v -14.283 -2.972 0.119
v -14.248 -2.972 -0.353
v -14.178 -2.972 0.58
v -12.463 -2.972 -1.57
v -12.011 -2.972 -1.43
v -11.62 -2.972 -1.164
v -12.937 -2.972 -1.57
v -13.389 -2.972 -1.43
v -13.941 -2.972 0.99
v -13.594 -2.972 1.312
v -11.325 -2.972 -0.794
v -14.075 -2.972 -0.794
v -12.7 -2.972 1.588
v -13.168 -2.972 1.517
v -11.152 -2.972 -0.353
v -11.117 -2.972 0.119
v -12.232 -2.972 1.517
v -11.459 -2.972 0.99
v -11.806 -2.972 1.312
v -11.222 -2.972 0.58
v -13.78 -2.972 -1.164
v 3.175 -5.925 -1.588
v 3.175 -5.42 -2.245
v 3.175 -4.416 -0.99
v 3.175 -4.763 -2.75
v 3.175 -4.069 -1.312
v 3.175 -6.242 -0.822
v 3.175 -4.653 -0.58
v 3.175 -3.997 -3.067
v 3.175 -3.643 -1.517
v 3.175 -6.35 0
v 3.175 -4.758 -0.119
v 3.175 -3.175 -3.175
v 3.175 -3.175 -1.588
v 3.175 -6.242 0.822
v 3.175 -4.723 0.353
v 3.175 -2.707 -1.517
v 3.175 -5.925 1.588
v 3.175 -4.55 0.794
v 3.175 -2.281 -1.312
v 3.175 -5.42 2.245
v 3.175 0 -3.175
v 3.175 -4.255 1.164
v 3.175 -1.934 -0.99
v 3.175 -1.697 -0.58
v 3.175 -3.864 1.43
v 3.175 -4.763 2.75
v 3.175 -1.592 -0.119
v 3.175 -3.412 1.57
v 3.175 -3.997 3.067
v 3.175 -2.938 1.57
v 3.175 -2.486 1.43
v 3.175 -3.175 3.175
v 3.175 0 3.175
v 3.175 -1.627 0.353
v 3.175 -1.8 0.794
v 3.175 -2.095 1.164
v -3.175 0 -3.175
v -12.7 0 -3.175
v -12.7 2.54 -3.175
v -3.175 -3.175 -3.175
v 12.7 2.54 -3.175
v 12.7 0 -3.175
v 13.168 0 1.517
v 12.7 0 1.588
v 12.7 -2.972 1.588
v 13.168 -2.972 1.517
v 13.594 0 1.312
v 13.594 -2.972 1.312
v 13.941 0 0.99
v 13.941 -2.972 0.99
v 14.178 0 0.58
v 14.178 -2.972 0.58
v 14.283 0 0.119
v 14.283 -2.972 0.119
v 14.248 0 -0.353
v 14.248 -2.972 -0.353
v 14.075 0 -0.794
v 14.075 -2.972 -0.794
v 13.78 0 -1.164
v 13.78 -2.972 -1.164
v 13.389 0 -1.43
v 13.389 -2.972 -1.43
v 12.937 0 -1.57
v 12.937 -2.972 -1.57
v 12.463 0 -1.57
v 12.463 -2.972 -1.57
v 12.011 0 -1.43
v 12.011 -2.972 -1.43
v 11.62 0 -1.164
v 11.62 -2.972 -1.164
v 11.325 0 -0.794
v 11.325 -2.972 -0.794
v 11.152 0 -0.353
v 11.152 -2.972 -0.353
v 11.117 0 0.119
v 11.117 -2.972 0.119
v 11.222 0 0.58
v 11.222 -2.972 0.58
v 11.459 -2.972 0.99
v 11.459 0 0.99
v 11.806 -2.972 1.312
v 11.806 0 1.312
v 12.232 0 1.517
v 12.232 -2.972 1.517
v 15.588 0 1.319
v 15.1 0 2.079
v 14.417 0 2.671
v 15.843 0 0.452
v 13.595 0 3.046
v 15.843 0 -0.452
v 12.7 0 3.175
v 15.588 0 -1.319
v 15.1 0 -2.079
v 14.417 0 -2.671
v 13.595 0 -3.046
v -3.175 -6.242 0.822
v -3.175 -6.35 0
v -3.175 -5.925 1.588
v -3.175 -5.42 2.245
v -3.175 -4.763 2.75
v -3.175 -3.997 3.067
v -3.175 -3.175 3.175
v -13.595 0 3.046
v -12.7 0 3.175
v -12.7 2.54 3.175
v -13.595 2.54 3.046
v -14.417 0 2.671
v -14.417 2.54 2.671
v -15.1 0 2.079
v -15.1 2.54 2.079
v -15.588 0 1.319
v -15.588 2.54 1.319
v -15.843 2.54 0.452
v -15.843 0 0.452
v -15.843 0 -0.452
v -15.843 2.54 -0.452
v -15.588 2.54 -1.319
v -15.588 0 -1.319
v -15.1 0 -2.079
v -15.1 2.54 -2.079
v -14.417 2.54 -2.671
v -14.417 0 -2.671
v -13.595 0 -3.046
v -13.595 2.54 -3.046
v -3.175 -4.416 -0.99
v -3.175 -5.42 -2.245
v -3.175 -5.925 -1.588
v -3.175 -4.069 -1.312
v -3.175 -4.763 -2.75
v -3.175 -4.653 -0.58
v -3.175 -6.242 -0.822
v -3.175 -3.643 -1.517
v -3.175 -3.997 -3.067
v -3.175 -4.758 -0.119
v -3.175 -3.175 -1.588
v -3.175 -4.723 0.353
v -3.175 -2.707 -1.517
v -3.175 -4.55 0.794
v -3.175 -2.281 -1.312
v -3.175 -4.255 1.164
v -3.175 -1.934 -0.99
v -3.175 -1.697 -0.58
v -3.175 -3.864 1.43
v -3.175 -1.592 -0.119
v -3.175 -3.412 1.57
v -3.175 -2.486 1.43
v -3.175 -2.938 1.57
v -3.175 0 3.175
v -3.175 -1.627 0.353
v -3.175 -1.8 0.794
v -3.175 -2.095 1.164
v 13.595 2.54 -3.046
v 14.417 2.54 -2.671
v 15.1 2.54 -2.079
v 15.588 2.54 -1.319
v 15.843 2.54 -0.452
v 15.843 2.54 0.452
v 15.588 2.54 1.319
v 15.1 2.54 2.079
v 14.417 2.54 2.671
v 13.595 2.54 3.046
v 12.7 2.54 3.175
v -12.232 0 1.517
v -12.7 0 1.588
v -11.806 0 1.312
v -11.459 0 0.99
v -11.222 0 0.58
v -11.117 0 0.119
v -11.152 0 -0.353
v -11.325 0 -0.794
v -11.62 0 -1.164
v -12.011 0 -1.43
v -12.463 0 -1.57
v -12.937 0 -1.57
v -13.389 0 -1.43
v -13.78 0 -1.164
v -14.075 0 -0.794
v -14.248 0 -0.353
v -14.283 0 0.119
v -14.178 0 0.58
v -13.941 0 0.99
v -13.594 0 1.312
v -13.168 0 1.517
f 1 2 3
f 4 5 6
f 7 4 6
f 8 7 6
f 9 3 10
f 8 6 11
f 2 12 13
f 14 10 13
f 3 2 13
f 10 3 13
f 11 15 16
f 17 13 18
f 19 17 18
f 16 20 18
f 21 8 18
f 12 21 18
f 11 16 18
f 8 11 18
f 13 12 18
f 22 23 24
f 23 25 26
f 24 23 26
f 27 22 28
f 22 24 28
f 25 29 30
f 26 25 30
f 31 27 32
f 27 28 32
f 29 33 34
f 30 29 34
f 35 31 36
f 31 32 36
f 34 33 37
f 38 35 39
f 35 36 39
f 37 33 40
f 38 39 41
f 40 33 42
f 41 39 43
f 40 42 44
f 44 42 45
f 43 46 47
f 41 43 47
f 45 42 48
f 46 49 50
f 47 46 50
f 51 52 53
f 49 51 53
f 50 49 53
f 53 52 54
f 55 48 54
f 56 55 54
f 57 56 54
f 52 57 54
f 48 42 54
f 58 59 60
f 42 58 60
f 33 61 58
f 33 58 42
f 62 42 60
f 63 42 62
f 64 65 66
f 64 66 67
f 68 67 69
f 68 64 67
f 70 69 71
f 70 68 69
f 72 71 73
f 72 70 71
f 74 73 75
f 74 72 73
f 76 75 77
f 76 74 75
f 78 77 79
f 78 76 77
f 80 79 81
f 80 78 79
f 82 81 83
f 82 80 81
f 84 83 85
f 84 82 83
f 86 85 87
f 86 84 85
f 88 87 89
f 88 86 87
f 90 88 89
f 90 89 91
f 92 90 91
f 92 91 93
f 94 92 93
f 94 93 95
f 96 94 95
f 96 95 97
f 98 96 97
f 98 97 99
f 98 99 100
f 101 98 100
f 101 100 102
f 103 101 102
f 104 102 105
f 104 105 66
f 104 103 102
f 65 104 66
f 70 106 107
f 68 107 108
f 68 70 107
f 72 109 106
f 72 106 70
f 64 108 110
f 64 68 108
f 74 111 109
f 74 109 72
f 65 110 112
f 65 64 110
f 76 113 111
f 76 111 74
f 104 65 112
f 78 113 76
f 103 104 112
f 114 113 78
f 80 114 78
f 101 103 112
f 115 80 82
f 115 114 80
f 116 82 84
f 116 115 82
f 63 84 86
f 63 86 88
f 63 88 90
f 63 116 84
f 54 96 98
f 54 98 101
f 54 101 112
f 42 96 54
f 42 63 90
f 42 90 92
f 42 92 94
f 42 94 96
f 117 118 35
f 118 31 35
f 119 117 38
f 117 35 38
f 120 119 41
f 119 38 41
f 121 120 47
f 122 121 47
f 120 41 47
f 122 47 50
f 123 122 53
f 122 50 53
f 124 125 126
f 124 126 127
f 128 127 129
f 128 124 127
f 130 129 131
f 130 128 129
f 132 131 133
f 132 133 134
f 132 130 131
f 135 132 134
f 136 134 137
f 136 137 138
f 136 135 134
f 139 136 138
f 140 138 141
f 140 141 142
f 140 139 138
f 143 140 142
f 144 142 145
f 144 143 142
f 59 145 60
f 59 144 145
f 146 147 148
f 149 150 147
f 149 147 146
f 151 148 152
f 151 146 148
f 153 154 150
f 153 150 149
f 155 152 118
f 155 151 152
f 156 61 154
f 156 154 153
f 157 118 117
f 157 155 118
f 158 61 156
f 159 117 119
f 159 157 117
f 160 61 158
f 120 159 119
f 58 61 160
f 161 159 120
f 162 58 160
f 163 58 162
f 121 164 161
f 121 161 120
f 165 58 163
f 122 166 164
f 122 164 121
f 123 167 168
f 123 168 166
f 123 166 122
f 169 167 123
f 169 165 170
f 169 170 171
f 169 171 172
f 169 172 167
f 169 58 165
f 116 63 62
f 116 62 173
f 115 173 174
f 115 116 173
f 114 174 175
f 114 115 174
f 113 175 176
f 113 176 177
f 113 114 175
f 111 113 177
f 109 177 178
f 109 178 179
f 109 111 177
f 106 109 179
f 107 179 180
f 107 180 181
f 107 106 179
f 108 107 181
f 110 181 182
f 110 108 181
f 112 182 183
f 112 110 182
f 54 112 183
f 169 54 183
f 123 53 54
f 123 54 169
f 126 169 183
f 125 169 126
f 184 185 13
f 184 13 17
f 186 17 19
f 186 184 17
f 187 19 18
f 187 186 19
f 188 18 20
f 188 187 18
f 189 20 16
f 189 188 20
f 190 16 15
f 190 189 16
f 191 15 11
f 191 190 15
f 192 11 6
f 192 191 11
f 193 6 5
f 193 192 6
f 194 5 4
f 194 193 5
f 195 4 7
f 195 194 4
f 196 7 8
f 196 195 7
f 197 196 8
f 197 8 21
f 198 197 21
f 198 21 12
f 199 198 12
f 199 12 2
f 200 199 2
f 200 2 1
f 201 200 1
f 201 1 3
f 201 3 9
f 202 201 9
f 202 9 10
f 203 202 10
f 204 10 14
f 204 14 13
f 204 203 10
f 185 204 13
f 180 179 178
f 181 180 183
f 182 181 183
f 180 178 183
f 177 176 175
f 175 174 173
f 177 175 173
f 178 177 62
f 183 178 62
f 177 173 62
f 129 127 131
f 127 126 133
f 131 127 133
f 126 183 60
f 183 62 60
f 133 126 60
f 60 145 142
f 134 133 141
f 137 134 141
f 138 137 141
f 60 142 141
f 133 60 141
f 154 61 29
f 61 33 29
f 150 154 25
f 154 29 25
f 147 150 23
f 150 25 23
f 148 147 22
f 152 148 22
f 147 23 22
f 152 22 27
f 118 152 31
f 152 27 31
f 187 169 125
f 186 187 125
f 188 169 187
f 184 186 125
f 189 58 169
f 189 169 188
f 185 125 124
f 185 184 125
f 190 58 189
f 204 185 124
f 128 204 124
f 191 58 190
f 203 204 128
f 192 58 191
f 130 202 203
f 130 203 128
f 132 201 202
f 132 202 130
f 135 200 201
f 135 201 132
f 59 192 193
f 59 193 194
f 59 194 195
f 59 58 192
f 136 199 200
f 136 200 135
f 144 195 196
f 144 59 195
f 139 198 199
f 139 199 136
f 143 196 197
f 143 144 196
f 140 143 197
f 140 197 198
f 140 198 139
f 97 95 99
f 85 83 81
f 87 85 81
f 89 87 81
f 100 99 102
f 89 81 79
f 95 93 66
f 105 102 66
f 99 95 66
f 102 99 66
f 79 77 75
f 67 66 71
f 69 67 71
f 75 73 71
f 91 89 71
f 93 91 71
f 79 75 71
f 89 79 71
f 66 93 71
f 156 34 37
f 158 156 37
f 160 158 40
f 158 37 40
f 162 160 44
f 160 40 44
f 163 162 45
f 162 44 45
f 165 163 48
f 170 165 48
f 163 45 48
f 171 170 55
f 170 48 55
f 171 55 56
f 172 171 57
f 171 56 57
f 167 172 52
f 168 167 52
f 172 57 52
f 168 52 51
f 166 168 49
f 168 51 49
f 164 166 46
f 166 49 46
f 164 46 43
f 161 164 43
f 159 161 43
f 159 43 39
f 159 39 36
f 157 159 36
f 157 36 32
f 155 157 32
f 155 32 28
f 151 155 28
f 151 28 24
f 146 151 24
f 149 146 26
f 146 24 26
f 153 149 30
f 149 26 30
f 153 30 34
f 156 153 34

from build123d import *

# Parameters (mm, degrees)
BOSS_EXTRUDE1_DEPTH = 2.54
SKETCH1_4_R         = 1.5875
BOSS_EXTRUDE3_DEPTH = 2.9718
SKETCH4_W           = 6.35
SKETCH4_H           = 6.35
BOSS_EXTRUDE4_DEPTH = 6.35
SKETCH5_R           = 1.5875
CUT_EXTRUDE1_DEPTH  = 6.35
FILLET1_R           = 3.175


with BuildPart() as part:
    # Sketch1 → Boss-Extrude1 (new body)
    with BuildSketch(Plane(origin=(0, 0, 0), x_dir=(1, 0, 0), z_dir=(0, 1, 0))):
        with BuildLine():
            Line((-12.7, 3.175), (12.7, 3.175))
            ThreePointArc((12.7, 3.175), (15.875, 0), (12.7, -3.175))
            Line((12.7, -3.175), (-12.7, -3.175))
            ThreePointArc((-12.7, -3.175), (-15.875, 0), (-12.7, 3.175))
        make_face()
    extrude(amount=BOSS_EXTRUDE1_DEPTH)

    # Sketch1<4> → Boss-Extrude3 (add)
    with BuildSketch(Plane(origin=(0, 0, 0), x_dir=(1, 0, 0), z_dir=(0, 1, 0))):
        with Locations(Location((-12.7, 0, 0), (0, 0, 270))):
            Circle(SKETCH1_4_R)
        with Locations(Location((12.7, 0, 0), (0, 0, 270))):
            Circle(SKETCH1_4_R)
    extrude(amount=-BOSS_EXTRUDE3_DEPTH)

    # Sketch4 → Boss-Extrude4 (add)
    with BuildSketch(Plane.XZ):
        Rectangle(SKETCH4_W, SKETCH4_H)
    extrude(amount=BOSS_EXTRUDE4_DEPTH)

    # Sketch5 → Cut-Extrude1 (cut)
    with BuildSketch(Plane(origin=(3.175, 0, 0), x_dir=(0, 0, -1), z_dir=(1, 0, 0))):
        with Locations((0, -3.175)):
            Circle(SKETCH5_R)
    extrude(amount=-CUT_EXTRUDE1_DEPTH, mode=Mode.SUBTRACT)

    # Fillet1
    fillet1_edges = [part.edges().sort_by_distance(p)[0] for p in [
        (0, -6.35, 3.175),
        (0, -6.35, -3.175),
    ]]
    fillet(fillet1_edges, radius=FILLET1_R - 0.0001)  # a hair under: the kernel refuses the full size


solid = part.part
